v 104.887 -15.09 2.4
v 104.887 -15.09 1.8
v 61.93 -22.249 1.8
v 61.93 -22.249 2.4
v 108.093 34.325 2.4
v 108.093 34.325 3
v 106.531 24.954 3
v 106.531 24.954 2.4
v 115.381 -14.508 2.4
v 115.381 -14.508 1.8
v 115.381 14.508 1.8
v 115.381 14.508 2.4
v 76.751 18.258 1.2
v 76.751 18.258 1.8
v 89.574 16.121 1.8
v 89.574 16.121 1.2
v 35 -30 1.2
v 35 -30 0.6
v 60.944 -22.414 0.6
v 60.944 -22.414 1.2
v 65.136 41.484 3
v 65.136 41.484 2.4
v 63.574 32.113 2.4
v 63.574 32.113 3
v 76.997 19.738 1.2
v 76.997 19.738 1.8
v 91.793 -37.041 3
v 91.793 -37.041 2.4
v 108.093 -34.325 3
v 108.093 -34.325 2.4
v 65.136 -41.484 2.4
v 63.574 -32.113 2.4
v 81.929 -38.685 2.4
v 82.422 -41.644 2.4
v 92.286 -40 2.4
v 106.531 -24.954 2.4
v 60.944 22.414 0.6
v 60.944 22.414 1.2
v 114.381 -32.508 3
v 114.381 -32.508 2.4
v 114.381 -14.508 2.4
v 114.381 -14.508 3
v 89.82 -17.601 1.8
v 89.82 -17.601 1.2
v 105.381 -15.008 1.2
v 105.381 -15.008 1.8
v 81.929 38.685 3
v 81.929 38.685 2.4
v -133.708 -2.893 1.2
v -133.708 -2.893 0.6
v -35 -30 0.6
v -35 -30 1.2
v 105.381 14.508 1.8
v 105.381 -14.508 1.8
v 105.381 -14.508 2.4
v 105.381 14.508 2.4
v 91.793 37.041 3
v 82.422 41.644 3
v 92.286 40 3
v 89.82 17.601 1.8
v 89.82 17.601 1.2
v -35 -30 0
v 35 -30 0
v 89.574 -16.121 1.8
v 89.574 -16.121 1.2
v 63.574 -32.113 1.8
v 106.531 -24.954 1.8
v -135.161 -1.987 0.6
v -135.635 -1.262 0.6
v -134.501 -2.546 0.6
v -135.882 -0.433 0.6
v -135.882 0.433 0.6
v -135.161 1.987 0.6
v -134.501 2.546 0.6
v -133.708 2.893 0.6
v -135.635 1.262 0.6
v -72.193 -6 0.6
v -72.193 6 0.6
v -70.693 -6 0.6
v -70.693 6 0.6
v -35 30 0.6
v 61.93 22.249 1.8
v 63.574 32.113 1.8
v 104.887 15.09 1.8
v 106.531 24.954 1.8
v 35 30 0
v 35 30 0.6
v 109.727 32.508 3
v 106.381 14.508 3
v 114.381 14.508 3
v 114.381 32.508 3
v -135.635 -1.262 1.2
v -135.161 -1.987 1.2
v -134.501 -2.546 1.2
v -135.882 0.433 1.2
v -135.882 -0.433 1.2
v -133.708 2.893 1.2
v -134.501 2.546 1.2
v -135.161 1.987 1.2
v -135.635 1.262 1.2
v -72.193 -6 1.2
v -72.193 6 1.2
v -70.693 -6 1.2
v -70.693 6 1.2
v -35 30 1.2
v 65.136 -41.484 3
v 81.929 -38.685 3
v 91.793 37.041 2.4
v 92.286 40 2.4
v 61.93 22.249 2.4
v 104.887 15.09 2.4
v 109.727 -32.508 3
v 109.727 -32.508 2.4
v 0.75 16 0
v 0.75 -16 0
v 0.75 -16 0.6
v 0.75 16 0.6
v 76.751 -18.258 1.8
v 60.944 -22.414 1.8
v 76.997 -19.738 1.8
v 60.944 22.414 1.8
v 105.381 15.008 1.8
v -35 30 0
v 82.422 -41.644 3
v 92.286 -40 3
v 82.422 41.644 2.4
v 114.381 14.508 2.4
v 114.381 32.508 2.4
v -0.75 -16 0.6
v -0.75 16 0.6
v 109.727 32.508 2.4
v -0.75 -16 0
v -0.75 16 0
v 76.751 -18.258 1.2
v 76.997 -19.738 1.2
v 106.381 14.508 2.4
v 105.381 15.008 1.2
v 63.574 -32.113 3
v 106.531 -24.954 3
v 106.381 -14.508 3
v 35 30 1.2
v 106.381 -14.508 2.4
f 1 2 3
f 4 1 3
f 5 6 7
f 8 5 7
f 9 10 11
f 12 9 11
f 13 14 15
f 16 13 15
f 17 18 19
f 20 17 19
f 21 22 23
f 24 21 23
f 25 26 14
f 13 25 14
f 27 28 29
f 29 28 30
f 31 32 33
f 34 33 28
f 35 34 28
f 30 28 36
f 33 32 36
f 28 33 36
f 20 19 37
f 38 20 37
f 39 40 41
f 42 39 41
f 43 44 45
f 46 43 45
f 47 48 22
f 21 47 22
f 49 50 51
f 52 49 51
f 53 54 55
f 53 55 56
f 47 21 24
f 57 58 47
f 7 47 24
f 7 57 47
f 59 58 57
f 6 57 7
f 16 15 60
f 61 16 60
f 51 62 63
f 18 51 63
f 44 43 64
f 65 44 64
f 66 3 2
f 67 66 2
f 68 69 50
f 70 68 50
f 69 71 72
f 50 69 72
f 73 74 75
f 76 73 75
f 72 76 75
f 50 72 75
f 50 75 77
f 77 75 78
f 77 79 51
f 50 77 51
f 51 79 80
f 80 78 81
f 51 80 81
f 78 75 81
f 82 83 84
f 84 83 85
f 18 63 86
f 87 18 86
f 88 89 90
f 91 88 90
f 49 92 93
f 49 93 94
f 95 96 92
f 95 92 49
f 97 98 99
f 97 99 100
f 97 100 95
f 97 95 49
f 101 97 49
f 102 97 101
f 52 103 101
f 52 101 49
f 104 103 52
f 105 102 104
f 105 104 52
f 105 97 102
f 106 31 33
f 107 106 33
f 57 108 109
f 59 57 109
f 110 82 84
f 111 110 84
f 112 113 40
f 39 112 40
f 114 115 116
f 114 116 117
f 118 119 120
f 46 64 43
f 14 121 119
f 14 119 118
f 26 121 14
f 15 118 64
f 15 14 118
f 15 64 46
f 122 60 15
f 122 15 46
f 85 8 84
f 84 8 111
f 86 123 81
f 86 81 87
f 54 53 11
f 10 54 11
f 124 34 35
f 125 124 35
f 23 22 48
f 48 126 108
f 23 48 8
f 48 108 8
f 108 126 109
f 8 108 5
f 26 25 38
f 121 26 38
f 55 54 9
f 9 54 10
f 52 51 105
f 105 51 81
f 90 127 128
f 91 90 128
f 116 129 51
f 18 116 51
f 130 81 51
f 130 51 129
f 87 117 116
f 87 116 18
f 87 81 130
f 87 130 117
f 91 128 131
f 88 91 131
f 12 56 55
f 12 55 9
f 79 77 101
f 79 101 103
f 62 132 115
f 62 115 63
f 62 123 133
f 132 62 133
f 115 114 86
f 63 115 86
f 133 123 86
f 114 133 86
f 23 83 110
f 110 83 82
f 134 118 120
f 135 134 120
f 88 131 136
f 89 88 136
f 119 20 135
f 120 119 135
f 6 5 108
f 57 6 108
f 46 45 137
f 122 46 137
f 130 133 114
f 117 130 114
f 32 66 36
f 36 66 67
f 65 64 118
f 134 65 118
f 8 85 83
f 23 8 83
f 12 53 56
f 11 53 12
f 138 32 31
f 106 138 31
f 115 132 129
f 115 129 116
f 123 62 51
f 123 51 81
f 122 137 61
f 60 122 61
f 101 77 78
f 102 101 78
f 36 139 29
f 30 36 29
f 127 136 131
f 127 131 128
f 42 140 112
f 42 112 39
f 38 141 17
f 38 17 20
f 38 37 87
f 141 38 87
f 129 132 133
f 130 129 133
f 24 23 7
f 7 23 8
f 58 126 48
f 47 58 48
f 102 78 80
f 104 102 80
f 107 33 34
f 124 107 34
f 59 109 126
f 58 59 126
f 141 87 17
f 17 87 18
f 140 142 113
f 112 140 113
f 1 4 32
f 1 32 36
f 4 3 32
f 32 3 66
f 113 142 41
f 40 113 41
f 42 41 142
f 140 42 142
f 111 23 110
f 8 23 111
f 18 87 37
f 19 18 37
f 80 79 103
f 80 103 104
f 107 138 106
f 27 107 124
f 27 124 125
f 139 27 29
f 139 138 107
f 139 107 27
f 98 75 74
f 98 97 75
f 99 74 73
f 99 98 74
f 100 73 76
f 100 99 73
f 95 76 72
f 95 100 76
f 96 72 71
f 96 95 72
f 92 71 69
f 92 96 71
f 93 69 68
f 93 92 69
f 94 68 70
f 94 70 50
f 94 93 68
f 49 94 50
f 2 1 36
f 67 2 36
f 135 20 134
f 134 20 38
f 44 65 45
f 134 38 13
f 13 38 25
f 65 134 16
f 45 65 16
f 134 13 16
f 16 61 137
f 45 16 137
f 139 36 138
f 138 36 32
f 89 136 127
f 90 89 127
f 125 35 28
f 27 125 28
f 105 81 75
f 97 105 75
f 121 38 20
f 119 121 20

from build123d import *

# Parameters (mm, degrees)
F0_W      = 70
F0_H      = 60
F0_W_2    = 1.5
F0_H_2    = 32
F1_DEPTH  = 0.6
F2_W      = 1.5
F2_H      = 12
F3_DEPTH  = 0.6
F5_DEPTH  = 0.6
F7_DEPTH  = 0.6
F9_DEPTH  = 0.6
F8_W      = 10
F8_H      = 29.0153087513
F11_DEPTH = 0.6
F13_DEPTH = 25
F15_DEPTH = 0.6
F17_DEPTH = 25
F18_R     = 3


with BuildPart() as f1:
    # F0 (on Top) → F1 (new body)
    with BuildSketch(Plane.XY):
        Rectangle(F0_W, F0_H)
        Rectangle(F0_W_2, F0_H_2, mode=Mode.SUBTRACT)
    extrude(amount=F1_DEPTH)


with BuildPart() as f3:
    # F2 (on face) → F3 (new body)
    with BuildSketch(Plane.XY.offset(0.6)):
        Polygon((-35, 30), (-144.242, 0), (-35, -30), align=None)
        with Locations((-71.443, 0)):
            Rectangle(F2_W, F2_H, mode=Mode.SUBTRACT)
    extrude(amount=F3_DEPTH)

    # F18
    f18_edges = [f3.edges().sort_by_distance(p)[0] for p in [
        (-144.242, 0, 0.9),
    ]]
    fillet(f18_edges, radius=F18_R)


with BuildPart() as f5:
    # F4 (on face) → F5 (new body)
    with BuildSketch(Plane.XY.offset(0.6)):
        Polygon((60.9435370421, 22.4135788579), (35, 30), (35, -30), (60.9435370421, -22.4135788579), align=None)
    extrude(amount=F5_DEPTH)


with BuildPart() as f7:
    # F6 (on face) → F7 (new body)
    with BuildSketch(Plane.XY.offset(1.2)):
        Polygon((105.3806249593, 15.0076543757), (60.9435370421, 22.4135788579), (60.9435370421, -22.4135788579), (105.3806249593, -15.0076543757), align=None)
    extrude(amount=F7_DEPTH)

    # F16 (on face) → F17 (cut)
    with BuildSketch(Plane.XY.offset(1.8)):
        Polygon((76.7505230383, -18.2584833457), (76.9971131986, -19.7380756182), (89.8202462269, -17.6009608952), (89.5736560666, -16.1213686227), align=None)
        Polygon((76.9971131986, 19.7380756182), (76.7505230383, 18.2584833457), (89.5736560666, 16.1213686227), (89.8202462269, 17.6009608952), align=None)
    extrude(amount=-F17_DEPTH, mode=Mode.SUBTRACT)


with BuildPart() as f9:
    # F8 (on face) → F9 (new body)
    with BuildSketch(Plane.XY.offset(1.8)):
        Polygon((105.3806249593, -15.0076543757), (61.9299318904, -22.2491854176), (63.5738662927, -32.1131339009), (107.0245593616, -24.8716028589), align=None)
    extrude(amount=F9_DEPTH)


with BuildPart() as f9b:
    # F8 (on face) → F9, piece 2 (new body)
    with BuildSketch(Plane.XY.offset(1.8)):
        Polygon((61.9299318904, 22.2491854176), (105.3806249593, 15.0076543757), (107.0245593616, 24.8716028589), (63.5738662927, 32.1131339009), align=None)
    extrude(amount=F9_DEPTH)


with BuildPart() as f9c:
    # F8 (on face) → F9, piece 3 (new body)
    with BuildSketch(Plane.XY.offset(1.8)):
        with Locations((110.3806249593, 0)):
            Rectangle(F8_W, F8_H)
    extrude(amount=F9_DEPTH)


with BuildPart() as f11:
    # F10 (on face) → F11 (new body)
    with BuildSketch(Plane.XY.offset(2.4)):
        Polygon((107.0245593616, -24.8716028589), (63.5738662927, -32.1131339009), (65.1356039748, -41.4838849601), (81.9289774892, -38.6850864366), (82.4221578099, -41.6442709816), (92.2861050716, -40.0003367829), (91.7929247509, -37.0411522379), (108.5862970437, -34.2423539181), align=None)
    extrude(amount=F11_DEPTH)


with BuildPart() as f11b:
    # F10 (on face) → F11, piece 2 (new body)
    with BuildSketch(Plane.XY.offset(2.4)):
        Polygon((91.7929247509, 37.0411522379), (92.2861050716, 40.0003367829), (82.4221578099, 41.6442709816), (81.9289774892, 38.6850864366), (65.1356039748, 41.4838849601), (63.5738662927, 32.1131339009), (107.0245593616, 24.8716028589), (108.5862970437, 34.2423539181), align=None)
    extrude(amount=F11_DEPTH)


with BuildPart() as f13_tool:
    # F12 (on face) → F13 (new body)
    with BuildSketch(Plane.XY.offset(3)):
        Polygon((108.9898869395, 36.0006503761), (108.0930996196, 34.3245506382), (104.8874275352, 15.0898510958), (107.0036945651, 14.7371521557), (111.1459434032, 36.8837378919), align=None)
        Polygon((107.0036945651, -14.7371521557), (104.8874275352, -15.0898510958), (108.0930996196, -34.3245506382), (108.9898869395, -36.0006503761), (111.1459434032, -36.8837378919), align=None)
    extrude(amount=-F13_DEPTH)


with BuildPart() as f9_1:
    add(f9.part)

    # F13: cut by f13_tool
    add(f13_tool.part, mode=Mode.SUBTRACT)


with BuildPart() as f9b_1:
    add(f9b.part)

    # F13: cut by f13_tool
    add(f13_tool.part, mode=Mode.SUBTRACT)


with BuildPart() as f11_1:
    add(f11.part)

    # F13: cut by f13_tool
    add(f13_tool.part, mode=Mode.SUBTRACT)


with BuildPart() as f11b_1:
    add(f11b.part)

    # F13: cut by f13_tool
    add(f13_tool.part, mode=Mode.SUBTRACT)


with BuildPart() as f15:
    # F14 (on face) → F15 (new body)
    with BuildSketch(Plane.XY.offset(2.4)):
        Polygon((109.7266301513, 32.5076543757), (106.3806249593, 14.5076543757), (114.3806249593, 14.5076543757), (114.3806249593, 32.5076543757), align=None)
    extrude(amount=F15_DEPTH)


with BuildPart() as f15b:
    # F14 (on face) → F15, piece 2 (new body)
    with BuildSketch(Plane.XY.offset(2.4)):
        Polygon((106.3806249593, -14.5076543757), (109.7266301513, -32.5076543757), (114.3806249593, -32.5076543757), (114.3806249593, -14.5076543757), align=None)
    extrude(amount=F15_DEPTH)


solid = Compound([f1.part, f3.part, f5.part, f7.part, f9c.part, f9_1.part, f9b_1.part, f11_1.part, f11b_1.part, f15.part, f15b.part])
